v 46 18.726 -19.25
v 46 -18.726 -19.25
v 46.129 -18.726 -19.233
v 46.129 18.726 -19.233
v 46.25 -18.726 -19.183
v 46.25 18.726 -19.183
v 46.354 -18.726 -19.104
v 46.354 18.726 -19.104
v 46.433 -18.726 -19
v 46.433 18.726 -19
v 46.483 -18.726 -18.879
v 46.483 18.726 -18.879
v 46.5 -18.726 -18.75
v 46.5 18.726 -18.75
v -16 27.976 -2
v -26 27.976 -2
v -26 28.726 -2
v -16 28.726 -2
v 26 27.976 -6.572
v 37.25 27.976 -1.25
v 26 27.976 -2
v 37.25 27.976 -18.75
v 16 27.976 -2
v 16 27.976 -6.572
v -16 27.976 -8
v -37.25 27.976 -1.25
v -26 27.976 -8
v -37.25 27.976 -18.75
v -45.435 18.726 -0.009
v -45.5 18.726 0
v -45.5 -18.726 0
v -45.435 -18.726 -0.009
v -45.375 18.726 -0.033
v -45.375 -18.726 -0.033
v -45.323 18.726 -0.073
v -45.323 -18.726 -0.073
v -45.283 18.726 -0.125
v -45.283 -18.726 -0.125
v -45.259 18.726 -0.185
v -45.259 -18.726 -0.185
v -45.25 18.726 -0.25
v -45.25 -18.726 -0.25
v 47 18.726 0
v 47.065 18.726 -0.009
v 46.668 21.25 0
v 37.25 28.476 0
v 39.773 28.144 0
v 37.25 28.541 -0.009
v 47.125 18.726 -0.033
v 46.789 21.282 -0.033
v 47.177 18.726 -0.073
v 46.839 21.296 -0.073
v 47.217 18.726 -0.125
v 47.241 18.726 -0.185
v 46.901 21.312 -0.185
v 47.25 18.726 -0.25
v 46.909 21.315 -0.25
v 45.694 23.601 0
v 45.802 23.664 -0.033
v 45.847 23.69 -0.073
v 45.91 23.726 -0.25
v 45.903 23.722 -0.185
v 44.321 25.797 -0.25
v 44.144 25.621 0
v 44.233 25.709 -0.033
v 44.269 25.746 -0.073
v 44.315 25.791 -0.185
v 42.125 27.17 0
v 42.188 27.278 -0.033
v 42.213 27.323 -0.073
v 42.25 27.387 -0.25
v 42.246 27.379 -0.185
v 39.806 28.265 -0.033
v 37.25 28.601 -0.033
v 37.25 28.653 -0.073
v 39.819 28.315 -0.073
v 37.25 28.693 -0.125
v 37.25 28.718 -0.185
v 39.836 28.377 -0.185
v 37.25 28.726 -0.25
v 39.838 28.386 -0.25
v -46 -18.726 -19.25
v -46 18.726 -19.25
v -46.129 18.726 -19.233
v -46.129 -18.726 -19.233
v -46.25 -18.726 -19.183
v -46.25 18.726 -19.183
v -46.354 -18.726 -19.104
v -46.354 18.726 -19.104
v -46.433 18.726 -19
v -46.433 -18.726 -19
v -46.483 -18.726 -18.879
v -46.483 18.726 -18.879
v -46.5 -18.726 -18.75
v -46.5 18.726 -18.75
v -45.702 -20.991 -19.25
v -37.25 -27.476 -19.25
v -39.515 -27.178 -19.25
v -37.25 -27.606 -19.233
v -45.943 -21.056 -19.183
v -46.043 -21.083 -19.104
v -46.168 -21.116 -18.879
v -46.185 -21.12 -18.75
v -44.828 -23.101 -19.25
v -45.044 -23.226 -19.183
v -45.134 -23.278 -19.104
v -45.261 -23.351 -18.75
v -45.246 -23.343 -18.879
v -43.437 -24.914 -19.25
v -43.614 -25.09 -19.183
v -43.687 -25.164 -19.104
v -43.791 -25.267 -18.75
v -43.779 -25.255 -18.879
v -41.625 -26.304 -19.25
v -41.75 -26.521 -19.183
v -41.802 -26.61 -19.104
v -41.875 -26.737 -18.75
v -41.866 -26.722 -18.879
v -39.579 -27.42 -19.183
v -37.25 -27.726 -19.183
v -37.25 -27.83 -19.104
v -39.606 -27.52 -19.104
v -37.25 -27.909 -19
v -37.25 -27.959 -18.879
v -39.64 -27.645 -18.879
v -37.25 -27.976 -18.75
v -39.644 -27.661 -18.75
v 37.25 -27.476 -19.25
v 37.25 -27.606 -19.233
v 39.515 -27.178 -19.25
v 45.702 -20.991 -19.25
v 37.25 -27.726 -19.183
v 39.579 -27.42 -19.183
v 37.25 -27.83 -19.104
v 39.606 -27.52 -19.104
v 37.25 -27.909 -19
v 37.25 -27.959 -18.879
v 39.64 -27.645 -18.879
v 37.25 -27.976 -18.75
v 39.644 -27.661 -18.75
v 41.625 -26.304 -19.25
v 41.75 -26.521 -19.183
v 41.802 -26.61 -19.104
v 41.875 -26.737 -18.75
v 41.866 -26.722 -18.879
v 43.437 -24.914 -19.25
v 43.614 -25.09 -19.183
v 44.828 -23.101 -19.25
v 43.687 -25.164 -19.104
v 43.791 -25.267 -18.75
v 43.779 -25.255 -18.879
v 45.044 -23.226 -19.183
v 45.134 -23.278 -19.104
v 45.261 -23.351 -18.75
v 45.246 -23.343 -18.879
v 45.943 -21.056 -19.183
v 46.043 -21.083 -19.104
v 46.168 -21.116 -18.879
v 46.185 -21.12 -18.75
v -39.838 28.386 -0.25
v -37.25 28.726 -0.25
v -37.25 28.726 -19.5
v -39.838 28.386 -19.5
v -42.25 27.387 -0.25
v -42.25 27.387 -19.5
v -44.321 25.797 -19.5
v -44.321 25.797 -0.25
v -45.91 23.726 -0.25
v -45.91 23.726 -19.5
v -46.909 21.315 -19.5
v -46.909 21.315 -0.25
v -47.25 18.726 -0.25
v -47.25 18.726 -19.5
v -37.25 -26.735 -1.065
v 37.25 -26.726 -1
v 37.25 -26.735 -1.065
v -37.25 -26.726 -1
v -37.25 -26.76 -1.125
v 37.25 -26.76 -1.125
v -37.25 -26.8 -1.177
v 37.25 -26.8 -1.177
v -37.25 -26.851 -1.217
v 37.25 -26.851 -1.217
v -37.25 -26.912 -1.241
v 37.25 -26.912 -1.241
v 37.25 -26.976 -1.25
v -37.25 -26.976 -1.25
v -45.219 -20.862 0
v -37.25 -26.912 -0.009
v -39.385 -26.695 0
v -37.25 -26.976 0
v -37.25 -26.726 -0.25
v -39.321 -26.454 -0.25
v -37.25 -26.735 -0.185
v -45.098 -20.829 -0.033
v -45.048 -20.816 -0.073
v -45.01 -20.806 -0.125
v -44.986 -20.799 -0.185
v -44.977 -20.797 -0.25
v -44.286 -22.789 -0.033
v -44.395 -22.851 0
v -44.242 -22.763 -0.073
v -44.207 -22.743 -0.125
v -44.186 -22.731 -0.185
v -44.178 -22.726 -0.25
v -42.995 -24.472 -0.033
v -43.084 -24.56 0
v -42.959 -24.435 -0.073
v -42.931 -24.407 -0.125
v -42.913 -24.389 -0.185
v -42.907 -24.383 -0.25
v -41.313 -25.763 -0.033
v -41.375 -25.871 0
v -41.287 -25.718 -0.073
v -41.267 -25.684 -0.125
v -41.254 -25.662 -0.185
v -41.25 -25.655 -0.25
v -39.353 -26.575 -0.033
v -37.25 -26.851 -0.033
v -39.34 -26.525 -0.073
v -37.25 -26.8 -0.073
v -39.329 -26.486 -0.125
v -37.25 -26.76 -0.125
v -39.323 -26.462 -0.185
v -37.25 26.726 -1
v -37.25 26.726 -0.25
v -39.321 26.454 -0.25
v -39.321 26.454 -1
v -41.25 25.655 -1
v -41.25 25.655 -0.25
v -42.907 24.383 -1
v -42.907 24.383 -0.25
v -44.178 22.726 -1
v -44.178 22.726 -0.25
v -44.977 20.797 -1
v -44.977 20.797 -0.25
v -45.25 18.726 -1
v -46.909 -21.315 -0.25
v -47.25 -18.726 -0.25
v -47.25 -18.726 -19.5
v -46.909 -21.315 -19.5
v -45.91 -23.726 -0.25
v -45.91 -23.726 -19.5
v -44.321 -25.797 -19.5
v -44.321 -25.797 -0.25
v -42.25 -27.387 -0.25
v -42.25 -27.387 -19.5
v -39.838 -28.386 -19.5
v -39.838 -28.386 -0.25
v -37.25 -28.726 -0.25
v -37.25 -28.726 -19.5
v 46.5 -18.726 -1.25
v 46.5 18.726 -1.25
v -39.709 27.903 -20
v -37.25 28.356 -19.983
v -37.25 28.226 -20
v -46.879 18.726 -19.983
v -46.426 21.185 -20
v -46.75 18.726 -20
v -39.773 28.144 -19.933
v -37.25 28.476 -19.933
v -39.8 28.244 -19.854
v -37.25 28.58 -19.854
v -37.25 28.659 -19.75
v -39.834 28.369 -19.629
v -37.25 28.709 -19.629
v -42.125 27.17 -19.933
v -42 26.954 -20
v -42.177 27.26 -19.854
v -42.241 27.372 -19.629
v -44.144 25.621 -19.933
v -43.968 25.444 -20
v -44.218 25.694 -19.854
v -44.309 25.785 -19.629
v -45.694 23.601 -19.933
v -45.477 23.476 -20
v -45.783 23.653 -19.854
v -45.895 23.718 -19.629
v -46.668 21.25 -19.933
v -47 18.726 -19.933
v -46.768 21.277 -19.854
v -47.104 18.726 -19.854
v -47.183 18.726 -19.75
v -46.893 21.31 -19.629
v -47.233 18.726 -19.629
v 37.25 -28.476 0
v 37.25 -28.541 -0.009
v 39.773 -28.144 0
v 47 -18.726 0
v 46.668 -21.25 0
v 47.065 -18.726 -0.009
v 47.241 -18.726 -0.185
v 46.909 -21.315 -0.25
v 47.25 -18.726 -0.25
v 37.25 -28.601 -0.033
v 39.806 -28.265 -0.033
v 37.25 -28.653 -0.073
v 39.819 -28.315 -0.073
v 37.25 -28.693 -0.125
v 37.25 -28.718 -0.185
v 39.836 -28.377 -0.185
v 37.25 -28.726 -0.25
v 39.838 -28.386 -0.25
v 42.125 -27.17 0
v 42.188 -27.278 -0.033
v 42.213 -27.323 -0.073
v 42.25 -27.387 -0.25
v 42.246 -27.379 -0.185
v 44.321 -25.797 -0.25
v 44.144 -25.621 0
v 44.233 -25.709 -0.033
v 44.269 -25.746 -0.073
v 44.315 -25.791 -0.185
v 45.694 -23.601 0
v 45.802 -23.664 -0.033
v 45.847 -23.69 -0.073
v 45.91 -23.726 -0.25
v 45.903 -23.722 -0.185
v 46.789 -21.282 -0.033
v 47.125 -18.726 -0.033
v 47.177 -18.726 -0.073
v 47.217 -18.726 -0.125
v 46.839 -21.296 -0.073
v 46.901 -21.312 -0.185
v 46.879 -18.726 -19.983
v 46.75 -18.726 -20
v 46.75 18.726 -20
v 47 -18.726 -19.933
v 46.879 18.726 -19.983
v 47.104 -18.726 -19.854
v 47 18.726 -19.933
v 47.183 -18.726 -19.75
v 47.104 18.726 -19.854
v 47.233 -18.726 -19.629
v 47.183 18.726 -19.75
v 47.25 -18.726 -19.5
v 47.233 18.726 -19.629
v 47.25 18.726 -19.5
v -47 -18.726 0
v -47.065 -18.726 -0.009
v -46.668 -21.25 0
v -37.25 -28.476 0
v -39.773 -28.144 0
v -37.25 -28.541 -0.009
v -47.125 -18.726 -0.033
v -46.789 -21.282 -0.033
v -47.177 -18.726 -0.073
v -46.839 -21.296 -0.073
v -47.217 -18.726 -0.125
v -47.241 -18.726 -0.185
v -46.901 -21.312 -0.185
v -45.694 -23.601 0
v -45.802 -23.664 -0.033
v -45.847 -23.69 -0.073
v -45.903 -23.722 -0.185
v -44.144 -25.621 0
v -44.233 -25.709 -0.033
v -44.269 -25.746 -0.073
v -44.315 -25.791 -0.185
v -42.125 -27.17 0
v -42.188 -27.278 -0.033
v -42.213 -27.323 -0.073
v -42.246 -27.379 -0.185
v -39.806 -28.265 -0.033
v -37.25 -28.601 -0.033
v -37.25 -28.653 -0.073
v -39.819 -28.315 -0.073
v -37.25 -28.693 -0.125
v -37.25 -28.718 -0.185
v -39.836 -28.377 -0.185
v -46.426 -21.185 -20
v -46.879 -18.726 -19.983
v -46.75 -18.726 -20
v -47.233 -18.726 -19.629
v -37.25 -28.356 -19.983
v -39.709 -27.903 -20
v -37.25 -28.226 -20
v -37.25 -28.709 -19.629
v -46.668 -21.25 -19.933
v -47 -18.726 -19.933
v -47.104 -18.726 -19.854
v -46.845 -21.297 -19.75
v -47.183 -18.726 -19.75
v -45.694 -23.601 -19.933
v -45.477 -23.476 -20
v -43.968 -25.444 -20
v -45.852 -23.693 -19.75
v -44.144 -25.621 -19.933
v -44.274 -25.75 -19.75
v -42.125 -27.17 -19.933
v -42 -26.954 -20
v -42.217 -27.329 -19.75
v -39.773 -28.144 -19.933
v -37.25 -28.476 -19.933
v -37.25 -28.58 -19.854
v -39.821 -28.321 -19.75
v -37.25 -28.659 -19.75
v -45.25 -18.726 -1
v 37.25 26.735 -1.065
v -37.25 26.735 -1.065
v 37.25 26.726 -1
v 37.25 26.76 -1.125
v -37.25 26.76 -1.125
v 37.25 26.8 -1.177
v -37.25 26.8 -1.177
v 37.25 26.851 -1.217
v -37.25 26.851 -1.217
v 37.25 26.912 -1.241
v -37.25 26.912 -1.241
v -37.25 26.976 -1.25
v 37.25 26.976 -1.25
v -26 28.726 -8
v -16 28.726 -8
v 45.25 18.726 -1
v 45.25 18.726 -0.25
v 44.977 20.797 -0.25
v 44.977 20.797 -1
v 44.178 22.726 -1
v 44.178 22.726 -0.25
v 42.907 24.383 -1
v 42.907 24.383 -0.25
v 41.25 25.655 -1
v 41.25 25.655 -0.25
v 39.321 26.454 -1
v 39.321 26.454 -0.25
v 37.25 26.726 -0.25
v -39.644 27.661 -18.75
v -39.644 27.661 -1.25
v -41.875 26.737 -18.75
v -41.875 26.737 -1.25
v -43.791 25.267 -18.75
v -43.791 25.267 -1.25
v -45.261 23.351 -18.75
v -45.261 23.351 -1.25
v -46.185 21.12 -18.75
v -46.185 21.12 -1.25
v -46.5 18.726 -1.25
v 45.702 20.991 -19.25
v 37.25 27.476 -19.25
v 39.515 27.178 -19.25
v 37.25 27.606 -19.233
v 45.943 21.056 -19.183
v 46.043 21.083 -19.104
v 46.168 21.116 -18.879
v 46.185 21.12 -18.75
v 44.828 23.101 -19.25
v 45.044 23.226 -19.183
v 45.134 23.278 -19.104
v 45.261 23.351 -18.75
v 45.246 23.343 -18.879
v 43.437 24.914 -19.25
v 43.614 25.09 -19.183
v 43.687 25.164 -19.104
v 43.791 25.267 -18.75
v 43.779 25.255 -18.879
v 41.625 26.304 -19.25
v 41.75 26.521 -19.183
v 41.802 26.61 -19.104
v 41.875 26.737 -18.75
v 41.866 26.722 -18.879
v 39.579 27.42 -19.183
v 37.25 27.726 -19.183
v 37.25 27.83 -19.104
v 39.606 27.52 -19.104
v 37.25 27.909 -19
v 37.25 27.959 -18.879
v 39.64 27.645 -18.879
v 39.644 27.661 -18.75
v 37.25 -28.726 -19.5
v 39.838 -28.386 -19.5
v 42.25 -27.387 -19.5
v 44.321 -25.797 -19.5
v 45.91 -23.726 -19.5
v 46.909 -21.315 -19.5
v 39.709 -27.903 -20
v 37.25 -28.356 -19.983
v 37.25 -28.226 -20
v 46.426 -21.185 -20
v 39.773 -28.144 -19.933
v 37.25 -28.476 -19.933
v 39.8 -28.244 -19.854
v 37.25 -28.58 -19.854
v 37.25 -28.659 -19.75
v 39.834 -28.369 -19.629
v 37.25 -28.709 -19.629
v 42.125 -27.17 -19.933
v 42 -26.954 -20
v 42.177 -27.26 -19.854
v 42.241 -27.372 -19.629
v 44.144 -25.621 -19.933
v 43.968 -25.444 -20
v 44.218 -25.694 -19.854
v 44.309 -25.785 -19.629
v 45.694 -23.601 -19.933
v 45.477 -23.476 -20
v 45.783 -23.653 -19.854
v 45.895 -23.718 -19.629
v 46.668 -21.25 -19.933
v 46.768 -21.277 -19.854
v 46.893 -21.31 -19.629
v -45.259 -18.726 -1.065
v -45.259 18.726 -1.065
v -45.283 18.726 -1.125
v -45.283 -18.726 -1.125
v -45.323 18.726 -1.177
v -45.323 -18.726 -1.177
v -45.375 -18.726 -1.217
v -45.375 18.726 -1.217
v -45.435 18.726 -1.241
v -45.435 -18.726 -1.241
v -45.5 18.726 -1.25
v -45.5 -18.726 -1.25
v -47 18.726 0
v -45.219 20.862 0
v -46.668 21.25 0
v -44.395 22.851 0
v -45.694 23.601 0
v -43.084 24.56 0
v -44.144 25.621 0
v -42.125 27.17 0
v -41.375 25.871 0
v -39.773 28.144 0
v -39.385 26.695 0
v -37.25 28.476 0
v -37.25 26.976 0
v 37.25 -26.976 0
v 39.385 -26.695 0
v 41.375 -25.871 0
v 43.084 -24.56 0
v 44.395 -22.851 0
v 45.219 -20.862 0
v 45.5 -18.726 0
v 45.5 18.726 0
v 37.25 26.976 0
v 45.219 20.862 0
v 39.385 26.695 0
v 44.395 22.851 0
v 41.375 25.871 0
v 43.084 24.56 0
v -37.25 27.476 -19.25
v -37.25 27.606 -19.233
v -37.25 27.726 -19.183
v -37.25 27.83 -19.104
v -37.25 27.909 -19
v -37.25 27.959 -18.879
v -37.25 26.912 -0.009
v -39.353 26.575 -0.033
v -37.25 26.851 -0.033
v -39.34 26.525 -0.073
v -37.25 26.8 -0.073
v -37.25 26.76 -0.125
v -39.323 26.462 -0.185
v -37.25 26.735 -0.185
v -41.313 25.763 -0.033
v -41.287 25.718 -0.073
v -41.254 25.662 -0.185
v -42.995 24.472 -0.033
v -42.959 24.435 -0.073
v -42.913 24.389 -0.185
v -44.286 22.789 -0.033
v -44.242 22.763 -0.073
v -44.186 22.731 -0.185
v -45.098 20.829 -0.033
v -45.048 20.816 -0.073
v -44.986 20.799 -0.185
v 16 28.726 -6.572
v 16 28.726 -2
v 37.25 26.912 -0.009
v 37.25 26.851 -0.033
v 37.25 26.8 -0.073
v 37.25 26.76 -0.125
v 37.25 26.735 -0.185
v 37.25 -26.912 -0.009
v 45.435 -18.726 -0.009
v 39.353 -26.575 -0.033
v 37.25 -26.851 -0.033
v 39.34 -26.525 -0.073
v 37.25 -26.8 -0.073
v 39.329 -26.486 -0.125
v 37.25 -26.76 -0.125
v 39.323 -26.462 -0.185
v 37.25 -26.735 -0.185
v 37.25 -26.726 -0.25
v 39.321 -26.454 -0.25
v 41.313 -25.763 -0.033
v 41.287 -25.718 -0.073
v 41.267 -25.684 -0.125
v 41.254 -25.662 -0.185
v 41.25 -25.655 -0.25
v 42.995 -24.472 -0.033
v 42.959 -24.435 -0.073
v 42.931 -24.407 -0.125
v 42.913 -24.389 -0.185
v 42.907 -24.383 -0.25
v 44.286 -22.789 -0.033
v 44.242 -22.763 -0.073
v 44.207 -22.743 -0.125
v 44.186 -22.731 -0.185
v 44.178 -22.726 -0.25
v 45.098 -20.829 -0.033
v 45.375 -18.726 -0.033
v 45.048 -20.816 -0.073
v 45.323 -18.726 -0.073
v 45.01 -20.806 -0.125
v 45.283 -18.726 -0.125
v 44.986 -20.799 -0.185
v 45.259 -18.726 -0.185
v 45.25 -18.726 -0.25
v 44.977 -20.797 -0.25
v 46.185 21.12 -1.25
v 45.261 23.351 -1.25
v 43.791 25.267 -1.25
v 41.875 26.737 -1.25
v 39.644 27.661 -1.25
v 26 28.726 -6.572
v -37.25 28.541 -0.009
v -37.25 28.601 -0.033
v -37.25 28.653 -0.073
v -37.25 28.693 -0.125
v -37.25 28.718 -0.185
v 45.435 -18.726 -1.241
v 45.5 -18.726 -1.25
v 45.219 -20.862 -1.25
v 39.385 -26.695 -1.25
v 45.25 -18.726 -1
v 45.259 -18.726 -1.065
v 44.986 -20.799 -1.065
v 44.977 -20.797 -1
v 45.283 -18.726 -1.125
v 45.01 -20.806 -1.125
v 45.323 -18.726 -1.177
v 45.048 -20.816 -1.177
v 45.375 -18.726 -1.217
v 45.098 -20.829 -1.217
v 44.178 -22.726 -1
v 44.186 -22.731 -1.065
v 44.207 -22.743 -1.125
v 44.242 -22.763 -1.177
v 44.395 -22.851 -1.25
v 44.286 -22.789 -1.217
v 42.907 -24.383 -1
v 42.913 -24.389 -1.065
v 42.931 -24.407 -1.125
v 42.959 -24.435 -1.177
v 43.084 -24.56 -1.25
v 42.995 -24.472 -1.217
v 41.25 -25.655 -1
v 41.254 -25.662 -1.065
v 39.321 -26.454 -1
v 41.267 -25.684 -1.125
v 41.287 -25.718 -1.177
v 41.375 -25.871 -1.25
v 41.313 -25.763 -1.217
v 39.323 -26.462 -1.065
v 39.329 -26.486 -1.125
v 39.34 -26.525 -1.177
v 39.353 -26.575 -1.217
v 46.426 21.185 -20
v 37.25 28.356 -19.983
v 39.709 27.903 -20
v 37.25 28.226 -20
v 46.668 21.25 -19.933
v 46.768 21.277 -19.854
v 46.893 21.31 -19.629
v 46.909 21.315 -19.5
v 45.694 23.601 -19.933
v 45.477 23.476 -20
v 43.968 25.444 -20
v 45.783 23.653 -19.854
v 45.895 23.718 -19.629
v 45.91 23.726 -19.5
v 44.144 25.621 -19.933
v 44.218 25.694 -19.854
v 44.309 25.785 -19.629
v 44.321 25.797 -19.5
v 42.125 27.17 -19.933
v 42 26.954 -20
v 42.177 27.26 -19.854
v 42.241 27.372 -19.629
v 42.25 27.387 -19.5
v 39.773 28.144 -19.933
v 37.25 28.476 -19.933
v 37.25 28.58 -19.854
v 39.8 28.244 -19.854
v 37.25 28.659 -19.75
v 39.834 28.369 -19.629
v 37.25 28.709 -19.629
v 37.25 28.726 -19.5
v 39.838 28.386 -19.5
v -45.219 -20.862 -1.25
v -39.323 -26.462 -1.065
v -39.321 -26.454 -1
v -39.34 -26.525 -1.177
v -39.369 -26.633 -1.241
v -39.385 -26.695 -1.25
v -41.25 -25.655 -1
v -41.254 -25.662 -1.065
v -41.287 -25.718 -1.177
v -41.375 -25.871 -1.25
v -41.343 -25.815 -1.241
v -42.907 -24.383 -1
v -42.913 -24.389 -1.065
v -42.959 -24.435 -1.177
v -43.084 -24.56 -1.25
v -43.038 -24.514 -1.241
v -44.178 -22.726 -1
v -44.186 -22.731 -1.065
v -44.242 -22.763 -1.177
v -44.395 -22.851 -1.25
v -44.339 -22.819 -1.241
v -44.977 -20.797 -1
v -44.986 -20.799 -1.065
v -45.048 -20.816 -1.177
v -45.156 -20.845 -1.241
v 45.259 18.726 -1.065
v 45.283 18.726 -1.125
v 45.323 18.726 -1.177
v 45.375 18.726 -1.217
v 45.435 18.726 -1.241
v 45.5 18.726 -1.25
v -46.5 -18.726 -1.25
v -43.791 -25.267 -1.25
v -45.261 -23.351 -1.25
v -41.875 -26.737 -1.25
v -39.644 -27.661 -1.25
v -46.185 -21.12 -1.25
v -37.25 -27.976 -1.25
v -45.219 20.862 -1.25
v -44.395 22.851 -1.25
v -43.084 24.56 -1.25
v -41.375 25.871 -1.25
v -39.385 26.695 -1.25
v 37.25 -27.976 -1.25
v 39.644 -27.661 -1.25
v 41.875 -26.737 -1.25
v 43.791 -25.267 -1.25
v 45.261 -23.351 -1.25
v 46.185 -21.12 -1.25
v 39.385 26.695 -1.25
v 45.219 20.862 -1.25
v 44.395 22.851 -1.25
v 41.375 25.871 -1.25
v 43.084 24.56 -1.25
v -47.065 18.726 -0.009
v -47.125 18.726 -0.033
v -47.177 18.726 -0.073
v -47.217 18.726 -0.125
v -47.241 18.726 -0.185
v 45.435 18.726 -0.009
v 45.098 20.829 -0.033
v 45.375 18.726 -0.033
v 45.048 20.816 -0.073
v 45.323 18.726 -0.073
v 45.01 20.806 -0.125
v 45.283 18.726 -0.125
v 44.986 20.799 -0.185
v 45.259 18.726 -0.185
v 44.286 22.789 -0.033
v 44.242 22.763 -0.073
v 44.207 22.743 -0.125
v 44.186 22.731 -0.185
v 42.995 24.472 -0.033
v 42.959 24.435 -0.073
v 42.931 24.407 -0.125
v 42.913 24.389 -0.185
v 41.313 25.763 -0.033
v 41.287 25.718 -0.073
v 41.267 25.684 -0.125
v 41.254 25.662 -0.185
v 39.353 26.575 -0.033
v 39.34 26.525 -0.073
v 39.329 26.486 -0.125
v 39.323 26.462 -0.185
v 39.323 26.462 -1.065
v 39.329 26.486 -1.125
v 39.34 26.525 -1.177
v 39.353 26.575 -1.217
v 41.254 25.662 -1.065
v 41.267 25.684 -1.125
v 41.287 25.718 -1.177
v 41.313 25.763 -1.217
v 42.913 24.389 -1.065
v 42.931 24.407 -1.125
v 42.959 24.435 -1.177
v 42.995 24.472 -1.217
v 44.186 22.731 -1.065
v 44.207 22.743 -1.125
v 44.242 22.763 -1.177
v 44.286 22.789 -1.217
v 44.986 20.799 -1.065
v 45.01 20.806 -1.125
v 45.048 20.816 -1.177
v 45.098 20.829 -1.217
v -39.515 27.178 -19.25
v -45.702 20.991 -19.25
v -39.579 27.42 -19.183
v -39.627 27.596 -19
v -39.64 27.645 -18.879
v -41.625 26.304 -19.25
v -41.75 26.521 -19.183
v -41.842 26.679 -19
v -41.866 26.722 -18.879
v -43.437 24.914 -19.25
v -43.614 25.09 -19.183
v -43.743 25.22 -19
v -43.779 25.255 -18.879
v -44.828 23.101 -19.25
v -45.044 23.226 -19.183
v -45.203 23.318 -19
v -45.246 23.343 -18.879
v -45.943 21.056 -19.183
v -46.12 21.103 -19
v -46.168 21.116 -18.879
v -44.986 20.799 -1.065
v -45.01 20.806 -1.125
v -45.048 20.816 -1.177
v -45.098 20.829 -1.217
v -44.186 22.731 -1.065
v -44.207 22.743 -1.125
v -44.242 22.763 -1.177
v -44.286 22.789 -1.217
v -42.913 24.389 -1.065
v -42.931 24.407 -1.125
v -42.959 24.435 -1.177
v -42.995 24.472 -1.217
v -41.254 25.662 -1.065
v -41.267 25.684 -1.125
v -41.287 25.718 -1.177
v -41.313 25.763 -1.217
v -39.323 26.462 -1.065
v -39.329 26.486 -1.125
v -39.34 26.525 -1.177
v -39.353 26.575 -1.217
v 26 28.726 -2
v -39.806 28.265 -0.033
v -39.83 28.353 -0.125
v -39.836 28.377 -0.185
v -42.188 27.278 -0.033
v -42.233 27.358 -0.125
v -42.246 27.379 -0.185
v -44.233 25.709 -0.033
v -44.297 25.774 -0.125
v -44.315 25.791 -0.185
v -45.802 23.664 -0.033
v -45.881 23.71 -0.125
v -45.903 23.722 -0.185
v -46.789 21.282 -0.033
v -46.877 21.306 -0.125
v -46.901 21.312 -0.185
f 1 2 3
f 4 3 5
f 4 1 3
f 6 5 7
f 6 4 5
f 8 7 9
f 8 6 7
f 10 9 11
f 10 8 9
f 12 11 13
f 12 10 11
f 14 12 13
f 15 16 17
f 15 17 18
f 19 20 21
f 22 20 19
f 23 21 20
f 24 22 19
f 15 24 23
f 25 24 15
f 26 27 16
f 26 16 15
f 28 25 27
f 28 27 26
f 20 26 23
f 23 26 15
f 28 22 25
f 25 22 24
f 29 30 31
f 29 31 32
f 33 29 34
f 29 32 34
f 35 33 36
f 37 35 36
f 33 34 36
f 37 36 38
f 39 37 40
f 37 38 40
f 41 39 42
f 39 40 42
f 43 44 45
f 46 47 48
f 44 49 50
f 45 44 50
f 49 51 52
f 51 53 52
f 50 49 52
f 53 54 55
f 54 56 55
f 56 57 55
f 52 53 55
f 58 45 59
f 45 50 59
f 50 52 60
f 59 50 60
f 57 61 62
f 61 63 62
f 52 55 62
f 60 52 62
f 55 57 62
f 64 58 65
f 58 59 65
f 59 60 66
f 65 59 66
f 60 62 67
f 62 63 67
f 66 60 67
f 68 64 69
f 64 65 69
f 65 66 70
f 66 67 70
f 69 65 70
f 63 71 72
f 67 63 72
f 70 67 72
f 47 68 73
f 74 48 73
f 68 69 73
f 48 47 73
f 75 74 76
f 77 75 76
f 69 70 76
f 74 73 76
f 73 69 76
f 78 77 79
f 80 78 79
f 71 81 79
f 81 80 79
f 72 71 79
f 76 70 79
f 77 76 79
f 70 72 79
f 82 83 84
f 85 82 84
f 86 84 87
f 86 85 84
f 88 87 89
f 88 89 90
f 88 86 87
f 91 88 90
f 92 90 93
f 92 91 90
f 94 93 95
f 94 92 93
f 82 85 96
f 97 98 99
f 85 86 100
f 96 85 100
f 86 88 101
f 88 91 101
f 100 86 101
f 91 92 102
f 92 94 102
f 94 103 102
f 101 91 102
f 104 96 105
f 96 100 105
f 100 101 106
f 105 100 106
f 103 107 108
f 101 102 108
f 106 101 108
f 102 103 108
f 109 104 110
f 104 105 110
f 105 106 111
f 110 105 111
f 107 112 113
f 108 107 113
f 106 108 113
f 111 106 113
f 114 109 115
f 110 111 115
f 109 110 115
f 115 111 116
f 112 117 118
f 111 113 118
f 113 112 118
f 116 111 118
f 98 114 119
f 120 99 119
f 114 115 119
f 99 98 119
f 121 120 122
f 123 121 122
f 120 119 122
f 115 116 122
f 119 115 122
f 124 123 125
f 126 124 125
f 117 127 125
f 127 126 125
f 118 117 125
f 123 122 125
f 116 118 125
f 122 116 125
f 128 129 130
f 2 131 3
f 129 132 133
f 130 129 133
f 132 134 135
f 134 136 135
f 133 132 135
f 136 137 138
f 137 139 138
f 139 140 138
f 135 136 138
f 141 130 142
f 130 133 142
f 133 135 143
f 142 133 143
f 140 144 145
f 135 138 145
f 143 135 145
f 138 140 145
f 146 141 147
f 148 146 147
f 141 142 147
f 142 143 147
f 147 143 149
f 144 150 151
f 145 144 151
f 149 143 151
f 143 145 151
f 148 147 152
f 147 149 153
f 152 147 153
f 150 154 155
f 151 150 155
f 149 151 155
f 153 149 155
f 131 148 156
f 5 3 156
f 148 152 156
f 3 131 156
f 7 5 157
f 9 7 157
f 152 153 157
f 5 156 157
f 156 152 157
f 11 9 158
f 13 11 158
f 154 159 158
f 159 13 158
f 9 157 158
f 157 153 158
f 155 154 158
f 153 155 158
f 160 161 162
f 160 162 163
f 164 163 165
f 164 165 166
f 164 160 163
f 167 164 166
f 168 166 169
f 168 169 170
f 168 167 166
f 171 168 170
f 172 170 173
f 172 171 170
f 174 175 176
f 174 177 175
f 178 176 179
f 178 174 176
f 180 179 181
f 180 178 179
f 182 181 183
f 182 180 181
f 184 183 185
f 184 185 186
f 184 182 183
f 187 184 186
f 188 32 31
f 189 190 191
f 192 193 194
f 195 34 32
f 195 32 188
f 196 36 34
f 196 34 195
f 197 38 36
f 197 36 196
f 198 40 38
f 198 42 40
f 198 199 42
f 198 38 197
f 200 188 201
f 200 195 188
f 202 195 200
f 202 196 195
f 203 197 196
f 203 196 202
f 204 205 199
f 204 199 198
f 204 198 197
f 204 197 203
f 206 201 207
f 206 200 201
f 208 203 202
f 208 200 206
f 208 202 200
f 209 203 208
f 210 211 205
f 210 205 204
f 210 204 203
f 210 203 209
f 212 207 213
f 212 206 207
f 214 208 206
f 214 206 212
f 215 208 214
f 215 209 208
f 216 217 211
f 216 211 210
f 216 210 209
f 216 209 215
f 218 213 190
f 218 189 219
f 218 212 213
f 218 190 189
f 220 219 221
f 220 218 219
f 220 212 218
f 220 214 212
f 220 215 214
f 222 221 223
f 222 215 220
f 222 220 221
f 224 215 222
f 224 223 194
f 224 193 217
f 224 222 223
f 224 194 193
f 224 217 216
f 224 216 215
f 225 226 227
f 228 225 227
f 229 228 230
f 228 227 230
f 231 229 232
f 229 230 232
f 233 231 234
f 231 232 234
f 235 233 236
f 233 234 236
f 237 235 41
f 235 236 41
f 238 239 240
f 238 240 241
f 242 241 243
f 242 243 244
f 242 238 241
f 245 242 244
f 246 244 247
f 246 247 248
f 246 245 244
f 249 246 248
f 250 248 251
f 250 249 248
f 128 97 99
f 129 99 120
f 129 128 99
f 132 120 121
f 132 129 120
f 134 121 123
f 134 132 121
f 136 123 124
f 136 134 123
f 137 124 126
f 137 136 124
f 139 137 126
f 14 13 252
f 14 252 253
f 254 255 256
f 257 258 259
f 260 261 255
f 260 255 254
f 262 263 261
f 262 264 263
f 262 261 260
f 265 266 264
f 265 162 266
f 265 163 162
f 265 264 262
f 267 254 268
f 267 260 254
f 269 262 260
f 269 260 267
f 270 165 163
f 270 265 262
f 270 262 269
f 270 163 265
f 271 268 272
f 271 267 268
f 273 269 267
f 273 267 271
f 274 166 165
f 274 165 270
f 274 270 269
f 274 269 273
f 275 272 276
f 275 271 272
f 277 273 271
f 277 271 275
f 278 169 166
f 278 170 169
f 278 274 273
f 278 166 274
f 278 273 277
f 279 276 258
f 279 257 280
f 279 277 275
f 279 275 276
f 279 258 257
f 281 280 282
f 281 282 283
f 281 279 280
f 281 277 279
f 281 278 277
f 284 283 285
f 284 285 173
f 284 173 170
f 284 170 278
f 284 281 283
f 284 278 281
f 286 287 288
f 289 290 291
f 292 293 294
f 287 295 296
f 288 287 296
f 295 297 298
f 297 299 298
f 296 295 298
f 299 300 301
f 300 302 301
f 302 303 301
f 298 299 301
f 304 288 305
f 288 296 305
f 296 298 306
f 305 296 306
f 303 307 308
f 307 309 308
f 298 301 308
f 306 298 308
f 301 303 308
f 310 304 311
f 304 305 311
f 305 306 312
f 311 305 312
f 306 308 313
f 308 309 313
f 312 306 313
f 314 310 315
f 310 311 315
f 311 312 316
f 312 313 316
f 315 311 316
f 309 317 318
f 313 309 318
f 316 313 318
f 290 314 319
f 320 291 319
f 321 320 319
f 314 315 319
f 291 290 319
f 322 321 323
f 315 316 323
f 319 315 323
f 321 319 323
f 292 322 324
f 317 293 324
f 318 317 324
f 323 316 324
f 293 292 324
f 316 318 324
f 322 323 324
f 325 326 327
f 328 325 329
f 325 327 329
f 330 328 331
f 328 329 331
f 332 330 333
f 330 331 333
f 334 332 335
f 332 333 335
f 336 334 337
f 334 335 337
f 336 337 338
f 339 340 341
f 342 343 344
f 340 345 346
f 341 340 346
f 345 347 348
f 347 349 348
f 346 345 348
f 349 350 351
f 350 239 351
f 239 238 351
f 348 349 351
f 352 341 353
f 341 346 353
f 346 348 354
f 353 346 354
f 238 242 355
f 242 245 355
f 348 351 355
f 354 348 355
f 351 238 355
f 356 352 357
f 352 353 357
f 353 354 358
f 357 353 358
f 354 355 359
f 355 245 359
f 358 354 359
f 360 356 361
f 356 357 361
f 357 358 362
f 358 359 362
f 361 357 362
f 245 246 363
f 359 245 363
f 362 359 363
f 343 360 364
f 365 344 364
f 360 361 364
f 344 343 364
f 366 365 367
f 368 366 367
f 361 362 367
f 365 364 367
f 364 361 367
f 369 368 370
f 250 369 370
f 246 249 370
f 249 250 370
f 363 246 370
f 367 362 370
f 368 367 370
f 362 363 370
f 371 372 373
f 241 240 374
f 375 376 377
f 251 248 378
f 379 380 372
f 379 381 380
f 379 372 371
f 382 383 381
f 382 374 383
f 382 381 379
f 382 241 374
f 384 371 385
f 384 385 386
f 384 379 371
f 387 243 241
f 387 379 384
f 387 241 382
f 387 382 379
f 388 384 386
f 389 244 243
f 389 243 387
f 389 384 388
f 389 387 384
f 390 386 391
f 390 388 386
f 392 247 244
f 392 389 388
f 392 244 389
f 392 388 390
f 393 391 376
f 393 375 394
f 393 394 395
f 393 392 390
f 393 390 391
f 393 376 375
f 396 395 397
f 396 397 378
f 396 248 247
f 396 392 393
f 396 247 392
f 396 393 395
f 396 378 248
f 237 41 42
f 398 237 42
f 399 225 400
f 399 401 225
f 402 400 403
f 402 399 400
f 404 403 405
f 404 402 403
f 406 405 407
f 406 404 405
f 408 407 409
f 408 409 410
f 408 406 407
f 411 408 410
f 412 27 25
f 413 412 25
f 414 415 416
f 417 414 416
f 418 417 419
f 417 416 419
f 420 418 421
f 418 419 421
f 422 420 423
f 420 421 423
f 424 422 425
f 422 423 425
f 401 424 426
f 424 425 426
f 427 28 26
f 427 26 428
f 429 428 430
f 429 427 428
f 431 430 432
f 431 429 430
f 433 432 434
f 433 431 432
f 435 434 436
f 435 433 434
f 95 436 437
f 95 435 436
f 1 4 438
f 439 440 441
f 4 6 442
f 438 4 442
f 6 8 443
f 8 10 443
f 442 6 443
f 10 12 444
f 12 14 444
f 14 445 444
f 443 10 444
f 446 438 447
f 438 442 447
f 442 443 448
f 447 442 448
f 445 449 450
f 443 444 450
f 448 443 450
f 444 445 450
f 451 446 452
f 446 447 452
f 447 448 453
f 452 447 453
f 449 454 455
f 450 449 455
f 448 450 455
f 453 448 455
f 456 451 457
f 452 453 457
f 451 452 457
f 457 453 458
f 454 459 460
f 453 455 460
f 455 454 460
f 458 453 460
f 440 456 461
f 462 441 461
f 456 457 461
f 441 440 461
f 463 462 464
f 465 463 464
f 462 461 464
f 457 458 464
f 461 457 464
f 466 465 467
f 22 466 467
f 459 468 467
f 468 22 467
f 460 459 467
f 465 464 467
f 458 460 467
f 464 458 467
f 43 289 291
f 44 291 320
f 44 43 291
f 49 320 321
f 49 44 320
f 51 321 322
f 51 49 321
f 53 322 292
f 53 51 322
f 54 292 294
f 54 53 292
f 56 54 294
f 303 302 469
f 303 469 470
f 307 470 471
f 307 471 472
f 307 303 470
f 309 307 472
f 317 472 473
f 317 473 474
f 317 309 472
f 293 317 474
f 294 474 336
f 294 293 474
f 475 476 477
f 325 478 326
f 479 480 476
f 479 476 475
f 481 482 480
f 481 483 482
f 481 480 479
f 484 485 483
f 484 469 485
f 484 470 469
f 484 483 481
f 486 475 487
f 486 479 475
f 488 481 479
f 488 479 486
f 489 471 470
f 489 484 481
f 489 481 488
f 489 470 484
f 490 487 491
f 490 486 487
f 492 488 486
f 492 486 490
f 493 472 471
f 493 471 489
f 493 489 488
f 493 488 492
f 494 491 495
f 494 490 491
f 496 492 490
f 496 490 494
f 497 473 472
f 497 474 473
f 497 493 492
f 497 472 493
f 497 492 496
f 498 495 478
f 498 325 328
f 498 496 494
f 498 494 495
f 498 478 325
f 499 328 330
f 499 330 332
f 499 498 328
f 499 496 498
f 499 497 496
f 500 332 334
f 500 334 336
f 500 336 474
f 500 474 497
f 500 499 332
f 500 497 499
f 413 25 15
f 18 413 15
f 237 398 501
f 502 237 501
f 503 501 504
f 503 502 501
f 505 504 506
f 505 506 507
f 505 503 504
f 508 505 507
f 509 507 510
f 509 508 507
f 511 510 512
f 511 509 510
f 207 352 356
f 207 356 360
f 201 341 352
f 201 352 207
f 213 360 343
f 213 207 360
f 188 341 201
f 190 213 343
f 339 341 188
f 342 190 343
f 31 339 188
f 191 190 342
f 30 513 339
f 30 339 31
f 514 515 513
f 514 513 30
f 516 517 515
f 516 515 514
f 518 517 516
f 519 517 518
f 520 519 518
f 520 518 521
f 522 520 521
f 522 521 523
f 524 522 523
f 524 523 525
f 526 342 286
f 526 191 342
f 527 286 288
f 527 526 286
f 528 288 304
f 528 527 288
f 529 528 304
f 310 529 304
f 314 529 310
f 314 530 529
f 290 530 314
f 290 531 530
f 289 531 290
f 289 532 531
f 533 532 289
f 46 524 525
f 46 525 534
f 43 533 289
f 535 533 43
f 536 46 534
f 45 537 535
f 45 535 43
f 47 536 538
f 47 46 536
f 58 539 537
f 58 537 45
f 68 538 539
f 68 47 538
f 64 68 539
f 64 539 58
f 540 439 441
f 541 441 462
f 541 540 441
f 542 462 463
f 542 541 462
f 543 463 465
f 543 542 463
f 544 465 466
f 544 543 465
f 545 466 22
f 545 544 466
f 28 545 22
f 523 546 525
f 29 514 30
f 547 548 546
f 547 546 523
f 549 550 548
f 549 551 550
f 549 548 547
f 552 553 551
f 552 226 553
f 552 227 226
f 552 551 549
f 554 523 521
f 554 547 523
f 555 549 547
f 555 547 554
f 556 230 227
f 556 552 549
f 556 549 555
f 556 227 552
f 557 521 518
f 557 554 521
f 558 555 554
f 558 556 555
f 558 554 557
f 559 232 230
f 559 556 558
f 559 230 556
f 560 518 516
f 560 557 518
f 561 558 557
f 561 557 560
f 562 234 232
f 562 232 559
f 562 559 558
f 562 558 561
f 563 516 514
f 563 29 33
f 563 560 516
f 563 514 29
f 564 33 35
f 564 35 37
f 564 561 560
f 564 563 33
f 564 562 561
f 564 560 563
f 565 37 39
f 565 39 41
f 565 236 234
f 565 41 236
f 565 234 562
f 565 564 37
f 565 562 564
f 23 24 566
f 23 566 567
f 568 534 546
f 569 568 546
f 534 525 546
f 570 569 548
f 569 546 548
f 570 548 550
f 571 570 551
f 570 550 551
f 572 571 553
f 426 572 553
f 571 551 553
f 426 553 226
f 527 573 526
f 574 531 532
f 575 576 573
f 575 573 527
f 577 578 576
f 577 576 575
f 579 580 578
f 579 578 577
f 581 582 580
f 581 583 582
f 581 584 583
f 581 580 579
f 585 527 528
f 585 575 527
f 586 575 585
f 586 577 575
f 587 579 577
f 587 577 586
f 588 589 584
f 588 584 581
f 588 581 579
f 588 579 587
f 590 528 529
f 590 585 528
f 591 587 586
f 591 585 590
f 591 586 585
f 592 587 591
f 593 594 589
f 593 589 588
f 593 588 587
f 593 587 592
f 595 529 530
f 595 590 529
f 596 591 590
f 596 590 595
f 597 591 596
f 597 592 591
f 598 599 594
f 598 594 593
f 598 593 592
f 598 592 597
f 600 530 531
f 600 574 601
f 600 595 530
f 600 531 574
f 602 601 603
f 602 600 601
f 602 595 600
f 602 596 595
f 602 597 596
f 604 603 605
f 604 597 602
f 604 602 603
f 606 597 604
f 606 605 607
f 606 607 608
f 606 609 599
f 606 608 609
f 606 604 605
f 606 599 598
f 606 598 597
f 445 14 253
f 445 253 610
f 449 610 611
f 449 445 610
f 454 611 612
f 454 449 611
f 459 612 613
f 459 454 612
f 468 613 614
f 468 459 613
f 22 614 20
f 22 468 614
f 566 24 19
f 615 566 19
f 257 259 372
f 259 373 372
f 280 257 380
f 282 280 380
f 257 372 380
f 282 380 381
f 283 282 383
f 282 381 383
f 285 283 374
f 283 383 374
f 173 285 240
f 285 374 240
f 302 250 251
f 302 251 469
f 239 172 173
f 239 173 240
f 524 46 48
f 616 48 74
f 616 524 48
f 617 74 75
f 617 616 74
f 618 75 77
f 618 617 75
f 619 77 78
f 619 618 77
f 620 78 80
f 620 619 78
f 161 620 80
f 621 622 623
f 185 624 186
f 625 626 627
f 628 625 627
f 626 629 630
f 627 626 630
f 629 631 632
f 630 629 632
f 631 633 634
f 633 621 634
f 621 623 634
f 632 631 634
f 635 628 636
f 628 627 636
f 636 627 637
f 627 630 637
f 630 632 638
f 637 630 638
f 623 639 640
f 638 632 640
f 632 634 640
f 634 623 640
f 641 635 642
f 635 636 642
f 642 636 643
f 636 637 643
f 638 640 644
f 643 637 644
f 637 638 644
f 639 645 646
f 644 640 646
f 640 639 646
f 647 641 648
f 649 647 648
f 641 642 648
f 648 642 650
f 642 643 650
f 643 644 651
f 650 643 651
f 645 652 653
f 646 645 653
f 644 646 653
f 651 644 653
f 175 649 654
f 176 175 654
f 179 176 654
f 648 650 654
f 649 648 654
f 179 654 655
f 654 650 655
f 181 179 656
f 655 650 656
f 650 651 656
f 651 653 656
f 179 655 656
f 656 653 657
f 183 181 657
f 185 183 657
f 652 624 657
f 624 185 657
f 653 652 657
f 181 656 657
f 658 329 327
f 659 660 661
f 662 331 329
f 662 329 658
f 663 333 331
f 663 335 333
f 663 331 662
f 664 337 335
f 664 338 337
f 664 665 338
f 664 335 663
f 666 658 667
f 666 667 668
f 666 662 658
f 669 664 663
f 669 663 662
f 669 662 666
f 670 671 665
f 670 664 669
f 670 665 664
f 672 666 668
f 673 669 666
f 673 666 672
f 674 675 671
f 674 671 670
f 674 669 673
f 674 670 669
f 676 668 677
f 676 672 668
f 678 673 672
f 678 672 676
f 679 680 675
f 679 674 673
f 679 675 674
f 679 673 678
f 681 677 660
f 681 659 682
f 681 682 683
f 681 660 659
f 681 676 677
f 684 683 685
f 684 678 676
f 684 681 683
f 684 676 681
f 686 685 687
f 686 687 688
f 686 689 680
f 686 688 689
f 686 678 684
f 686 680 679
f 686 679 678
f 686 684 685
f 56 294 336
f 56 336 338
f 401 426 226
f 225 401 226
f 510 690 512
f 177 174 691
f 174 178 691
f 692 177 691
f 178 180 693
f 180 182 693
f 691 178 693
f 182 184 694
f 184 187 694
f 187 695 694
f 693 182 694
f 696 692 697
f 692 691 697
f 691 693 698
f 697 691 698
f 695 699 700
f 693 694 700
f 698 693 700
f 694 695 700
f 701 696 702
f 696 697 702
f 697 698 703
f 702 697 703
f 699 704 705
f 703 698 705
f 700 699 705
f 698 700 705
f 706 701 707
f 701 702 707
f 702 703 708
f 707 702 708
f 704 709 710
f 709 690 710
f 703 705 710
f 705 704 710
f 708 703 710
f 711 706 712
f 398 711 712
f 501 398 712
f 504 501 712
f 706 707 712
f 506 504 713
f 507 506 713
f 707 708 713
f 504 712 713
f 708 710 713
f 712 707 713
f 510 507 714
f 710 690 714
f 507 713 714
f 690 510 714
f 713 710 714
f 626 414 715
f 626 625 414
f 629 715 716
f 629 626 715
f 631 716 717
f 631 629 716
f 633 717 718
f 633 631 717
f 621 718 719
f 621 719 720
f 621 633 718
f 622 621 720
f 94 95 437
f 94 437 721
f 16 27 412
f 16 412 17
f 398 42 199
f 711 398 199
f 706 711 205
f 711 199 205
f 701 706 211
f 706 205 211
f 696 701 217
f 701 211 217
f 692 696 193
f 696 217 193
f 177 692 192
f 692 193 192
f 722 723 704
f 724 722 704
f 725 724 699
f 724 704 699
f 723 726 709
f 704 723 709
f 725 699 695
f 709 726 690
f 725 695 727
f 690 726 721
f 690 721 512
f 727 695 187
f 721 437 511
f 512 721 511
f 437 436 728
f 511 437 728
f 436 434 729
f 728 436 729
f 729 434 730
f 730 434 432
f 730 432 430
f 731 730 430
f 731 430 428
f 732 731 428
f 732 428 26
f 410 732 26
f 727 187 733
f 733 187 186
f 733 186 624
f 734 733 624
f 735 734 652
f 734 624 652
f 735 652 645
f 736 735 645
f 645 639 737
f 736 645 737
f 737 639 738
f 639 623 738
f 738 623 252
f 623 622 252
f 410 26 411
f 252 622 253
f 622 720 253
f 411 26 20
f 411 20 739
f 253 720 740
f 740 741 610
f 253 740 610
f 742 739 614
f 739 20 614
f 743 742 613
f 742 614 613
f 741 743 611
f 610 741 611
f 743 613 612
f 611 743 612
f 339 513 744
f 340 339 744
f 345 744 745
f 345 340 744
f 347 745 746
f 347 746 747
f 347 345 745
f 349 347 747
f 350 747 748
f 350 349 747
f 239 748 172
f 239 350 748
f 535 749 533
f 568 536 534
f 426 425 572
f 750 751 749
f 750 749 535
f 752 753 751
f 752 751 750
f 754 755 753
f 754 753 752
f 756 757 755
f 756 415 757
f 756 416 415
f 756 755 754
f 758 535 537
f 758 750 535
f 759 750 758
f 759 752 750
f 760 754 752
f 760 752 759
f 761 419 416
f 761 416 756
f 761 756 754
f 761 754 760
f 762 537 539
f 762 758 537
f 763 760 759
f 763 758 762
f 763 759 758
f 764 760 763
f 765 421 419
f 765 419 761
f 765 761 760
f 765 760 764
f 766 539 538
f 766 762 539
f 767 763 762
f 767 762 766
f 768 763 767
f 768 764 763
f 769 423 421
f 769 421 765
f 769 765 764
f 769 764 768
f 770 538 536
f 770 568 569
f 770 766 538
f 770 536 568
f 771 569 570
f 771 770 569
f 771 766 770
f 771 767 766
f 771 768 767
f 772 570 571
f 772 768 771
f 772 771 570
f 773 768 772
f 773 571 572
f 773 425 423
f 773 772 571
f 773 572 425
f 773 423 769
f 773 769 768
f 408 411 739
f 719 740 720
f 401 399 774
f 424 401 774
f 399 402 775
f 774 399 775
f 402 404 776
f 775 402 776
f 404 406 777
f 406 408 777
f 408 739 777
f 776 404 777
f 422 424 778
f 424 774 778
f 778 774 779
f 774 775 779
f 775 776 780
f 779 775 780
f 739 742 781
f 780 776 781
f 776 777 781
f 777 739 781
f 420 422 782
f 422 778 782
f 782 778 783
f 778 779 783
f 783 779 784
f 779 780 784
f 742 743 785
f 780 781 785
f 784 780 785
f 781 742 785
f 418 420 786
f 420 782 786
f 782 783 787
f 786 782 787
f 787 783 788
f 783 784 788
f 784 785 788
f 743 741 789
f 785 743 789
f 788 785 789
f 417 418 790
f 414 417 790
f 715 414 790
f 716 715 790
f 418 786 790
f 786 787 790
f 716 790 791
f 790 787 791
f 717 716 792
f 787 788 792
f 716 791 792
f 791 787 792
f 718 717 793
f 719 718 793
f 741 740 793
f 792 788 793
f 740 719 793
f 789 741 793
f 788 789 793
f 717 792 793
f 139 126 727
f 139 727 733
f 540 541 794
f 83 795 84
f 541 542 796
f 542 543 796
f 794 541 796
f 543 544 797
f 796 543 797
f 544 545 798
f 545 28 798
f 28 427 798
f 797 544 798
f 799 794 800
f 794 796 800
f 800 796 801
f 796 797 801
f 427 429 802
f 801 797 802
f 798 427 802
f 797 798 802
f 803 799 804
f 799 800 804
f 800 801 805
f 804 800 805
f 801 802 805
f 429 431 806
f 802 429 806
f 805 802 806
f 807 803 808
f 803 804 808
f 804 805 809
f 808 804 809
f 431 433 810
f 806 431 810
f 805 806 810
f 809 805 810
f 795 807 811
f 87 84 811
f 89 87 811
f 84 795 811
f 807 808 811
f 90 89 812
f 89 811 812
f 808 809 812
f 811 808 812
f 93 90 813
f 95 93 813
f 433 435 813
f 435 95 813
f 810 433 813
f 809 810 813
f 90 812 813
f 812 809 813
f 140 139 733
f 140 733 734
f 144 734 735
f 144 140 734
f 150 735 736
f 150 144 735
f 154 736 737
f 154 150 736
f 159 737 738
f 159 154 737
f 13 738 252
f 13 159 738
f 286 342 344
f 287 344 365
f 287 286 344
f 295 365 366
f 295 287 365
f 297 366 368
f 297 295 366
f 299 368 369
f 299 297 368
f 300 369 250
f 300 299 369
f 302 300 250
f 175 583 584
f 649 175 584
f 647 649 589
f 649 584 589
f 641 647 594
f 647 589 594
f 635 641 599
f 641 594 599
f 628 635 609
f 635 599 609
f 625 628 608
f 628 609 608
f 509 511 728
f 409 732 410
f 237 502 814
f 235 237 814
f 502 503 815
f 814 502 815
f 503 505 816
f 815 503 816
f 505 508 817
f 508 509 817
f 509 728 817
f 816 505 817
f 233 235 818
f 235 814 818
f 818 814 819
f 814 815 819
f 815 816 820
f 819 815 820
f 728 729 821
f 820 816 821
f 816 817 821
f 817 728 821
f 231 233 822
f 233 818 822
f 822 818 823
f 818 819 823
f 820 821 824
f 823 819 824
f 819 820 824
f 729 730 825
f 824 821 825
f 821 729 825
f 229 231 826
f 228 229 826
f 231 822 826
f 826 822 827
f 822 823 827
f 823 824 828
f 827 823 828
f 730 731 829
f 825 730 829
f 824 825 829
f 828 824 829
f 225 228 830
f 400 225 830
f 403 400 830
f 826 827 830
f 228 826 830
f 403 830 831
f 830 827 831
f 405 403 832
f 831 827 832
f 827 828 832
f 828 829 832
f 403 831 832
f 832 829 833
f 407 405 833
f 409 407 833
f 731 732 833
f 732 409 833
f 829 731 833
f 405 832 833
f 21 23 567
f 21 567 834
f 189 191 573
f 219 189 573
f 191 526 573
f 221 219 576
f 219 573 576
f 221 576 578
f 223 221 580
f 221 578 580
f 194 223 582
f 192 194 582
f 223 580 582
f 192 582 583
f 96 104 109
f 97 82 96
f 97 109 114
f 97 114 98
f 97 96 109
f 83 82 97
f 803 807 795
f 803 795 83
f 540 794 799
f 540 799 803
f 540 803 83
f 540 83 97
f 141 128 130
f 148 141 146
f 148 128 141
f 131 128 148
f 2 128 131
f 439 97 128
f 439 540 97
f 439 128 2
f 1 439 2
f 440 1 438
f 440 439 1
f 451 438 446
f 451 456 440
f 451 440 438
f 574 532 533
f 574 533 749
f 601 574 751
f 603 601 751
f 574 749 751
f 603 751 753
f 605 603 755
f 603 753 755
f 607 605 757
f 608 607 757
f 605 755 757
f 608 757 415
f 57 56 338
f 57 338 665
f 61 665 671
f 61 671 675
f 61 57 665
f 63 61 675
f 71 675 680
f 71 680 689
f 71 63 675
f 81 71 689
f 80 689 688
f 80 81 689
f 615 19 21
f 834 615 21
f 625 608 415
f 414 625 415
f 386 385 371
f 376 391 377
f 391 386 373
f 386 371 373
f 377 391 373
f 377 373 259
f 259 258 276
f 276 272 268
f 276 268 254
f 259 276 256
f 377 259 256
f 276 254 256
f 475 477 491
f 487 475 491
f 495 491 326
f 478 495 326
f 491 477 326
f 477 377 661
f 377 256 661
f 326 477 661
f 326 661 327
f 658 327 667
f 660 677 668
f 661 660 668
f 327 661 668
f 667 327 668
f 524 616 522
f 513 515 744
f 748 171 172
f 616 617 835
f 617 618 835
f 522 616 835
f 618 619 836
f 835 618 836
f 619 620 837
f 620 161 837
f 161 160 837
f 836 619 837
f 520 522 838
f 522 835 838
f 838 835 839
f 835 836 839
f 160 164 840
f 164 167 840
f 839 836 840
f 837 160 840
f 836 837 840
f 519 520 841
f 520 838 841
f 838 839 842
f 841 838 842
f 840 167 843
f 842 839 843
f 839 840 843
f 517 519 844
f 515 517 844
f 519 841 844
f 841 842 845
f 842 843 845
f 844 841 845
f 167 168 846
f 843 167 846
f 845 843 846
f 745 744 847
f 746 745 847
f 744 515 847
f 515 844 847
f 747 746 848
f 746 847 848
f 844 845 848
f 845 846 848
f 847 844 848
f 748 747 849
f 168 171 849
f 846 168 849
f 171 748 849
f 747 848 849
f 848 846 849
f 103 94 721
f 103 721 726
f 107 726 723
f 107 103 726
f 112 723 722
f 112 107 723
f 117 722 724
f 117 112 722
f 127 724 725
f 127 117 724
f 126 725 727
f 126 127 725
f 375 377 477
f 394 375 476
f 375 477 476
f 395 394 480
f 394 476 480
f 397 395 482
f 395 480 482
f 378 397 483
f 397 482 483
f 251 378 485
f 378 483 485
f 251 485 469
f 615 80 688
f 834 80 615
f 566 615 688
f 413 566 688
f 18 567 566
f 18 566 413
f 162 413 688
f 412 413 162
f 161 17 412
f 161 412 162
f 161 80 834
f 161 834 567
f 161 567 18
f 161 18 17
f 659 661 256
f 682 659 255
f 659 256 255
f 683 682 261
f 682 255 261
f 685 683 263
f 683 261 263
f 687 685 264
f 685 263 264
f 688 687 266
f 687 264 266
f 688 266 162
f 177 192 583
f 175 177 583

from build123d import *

# Parameters (mm, degrees)
F1_DEPTH = 20
F3_DEPTH = 19.25
F5_DEPTH = 18
F6_W     = 10
F6_H     = 6
F6_H_2   = 4.5720012859
F7_DEPTH = 28.7263803184
F8_R     = 0.25
F9_R     = 0.5


with BuildPart() as f1:
    # F0 (on Top) → F1 (new body)
    with BuildSketch(Plane.XY):
        with BuildLine():
            ThreePointArc((47.25, 18.7263803184), (44.3210678119, 25.7974481303), (37.25, 28.7263803184))
            Line((37.25, 28.7263803184), (-37.25, 28.7263803184))
            ThreePointArc((-37.25, 28.7263803184), (-44.3210678119, 25.7974481303), (-47.25, 18.7263803184))
            Line((-47.25, 18.7263803184), (-47.25, -18.7263803184))
            ThreePointArc((-47.25, -18.7263803184), (-44.3210678119, -25.7974481303), (-37.25, -28.7263803184))
            Line((-37.25, -28.7263803184), (37.25, -28.7263803184))
            ThreePointArc((37.25, -28.7263803184), (44.3210678119, -25.7974481303), (47.25, -18.7263803184))
            Line((47.25, -18.7263803184), (47.25, 18.7263803184))
        make_face()
    extrude(amount=-F1_DEPTH)

    # F2 (on Top) → F3 (cut)
    with BuildSketch(Plane.XY):
        with BuildLine():
            Line((-45.25, 18.7263803184), (-45.25, -18.7263803184))
            ThreePointArc((-45.25, -18.7263803184), (-42.9068542495, -24.3832345679), (-37.25, -26.7263803184))
            Line((-37.25, -26.7263803184), (37.25, -26.7263803184))
            ThreePointArc((37.25, -26.7263803184), (42.9068542495, -24.3832345679), (45.25, -18.7263803184))
            Line((45.25, -18.7263803184), (45.25, 18.7263803184))
            ThreePointArc((45.25, 18.7263803184), (42.9068542495, 24.3832345679), (37.25, 26.7263803184))
            Line((37.25, 26.7263803184), (-37.25, 26.7263803184))
            ThreePointArc((-37.25, 26.7263803184), (-42.9068542495, 24.3832345679), (-45.25, 18.7263803184))
        make_face()
    extrude(amount=-F3_DEPTH, mode=Mode.SUBTRACT)

    # F4 (on face) → F5 (cut)
    with BuildSketch(Plane.XY.offset(-19.25)):
        with BuildLine():
            ThreePointArc((46.5, 18.7263803184), (43.790737726, 25.2671180444), (37.25, 27.9763803184))
            Line((37.25, 27.9763803184), (-37.25, 27.9763803184))
            ThreePointArc((-37.25, 27.9763803184), (-43.790737726, 25.2671180444), (-46.5, 18.7263803184))
            Line((-46.5, 18.7263803184), (-46.5, -18.7263803184))
            ThreePointArc((-46.5, -18.7263803184), (-43.790737726, -25.2671180444), (-37.25, -27.9763803184))
            Line((-37.25, -27.9763803184), (37.25, -27.9763803184))
            ThreePointArc((37.25, -27.9763803184), (43.790737726, -25.2671180444), (46.5, -18.7263803184))
            Line((46.5, -18.7263803184), (46.5, 18.7263803184))
        make_face()
    extrude(amount=F5_DEPTH, mode=Mode.SUBTRACT)

    # F6 (on Front) → F7 (cut, through all)
    with BuildSketch(Plane.XZ):
        with Locations((-21, -5)):
            Rectangle(F6_W, F6_H)
        with Locations((21, -4.2860006429)):
            Rectangle(F6_W, F6_H_2)
    extrude(amount=-F7_DEPTH, mode=Mode.SUBTRACT)

    # F8
    f8_edges = [f1.edges().sort_by_distance(p)[0] for p in [
        (-45.25, 0, 0),
        (-47.25, 0, 0),
        (-44.321068, 25.797448, 0),
        (-42.906854, 24.383235, 0),
        (0, 28.72638, 0),
        (0, 26.72638, 0),
        (44.321068, 25.797448, 0),
        (42.906854, 24.383235, 0),
        (47.25, 0, 0),
        (45.25, 0, 0),
        (44.321068, -25.797448, 0),
        (42.906854, -24.383235, 0),
        (0, -28.72638, 0),
        (0, -26.72638, 0),
        (-44.321068, -25.797448, 0),
        (-42.906854, -24.383235, 0),
        (-45.25, 0, -1.25),
        (-42.906854, 24.383235, -1.25),
        (0, 26.72638, -1.25),
        (42.906854, 24.383235, -1.25),
        (45.25, 0, -1.25),
        (0, -26.72638, -1.25),
        (42.906854, -24.383235, -1.25),
        (-42.906854, -24.383235, -1.25),
    ]]
    fillet(f8_edges, radius=F8_R)

    # F9
    f9_edges = [f1.edges().sort_by_distance(p)[0] for p in [
        (-44.321068, -25.797448, -20),
        (0, -28.72638, -20),
        (-47.25, 0, -20),
        (-44.321068, 25.797448, -20),
        (0, 28.72638, -20),
        (44.321068, 25.797448, -20),
        (47.25, 0, -20),
        (44.321068, -25.797448, -20),
        (-46.5, 0, -19.25),
        (-43.790738, 25.267118, -19.25),
        (0, 27.97638, -19.25),
        (43.790738, 25.267118, -19.25),
        (46.5, 0, -19.25),
        (43.790738, -25.267118, -19.25),
        (0, -27.97638, -19.25),
        (-43.790738, -25.267118, -19.25),
    ]]
    fillet(f9_edges, radius=F9_R)


solid = f1.part
